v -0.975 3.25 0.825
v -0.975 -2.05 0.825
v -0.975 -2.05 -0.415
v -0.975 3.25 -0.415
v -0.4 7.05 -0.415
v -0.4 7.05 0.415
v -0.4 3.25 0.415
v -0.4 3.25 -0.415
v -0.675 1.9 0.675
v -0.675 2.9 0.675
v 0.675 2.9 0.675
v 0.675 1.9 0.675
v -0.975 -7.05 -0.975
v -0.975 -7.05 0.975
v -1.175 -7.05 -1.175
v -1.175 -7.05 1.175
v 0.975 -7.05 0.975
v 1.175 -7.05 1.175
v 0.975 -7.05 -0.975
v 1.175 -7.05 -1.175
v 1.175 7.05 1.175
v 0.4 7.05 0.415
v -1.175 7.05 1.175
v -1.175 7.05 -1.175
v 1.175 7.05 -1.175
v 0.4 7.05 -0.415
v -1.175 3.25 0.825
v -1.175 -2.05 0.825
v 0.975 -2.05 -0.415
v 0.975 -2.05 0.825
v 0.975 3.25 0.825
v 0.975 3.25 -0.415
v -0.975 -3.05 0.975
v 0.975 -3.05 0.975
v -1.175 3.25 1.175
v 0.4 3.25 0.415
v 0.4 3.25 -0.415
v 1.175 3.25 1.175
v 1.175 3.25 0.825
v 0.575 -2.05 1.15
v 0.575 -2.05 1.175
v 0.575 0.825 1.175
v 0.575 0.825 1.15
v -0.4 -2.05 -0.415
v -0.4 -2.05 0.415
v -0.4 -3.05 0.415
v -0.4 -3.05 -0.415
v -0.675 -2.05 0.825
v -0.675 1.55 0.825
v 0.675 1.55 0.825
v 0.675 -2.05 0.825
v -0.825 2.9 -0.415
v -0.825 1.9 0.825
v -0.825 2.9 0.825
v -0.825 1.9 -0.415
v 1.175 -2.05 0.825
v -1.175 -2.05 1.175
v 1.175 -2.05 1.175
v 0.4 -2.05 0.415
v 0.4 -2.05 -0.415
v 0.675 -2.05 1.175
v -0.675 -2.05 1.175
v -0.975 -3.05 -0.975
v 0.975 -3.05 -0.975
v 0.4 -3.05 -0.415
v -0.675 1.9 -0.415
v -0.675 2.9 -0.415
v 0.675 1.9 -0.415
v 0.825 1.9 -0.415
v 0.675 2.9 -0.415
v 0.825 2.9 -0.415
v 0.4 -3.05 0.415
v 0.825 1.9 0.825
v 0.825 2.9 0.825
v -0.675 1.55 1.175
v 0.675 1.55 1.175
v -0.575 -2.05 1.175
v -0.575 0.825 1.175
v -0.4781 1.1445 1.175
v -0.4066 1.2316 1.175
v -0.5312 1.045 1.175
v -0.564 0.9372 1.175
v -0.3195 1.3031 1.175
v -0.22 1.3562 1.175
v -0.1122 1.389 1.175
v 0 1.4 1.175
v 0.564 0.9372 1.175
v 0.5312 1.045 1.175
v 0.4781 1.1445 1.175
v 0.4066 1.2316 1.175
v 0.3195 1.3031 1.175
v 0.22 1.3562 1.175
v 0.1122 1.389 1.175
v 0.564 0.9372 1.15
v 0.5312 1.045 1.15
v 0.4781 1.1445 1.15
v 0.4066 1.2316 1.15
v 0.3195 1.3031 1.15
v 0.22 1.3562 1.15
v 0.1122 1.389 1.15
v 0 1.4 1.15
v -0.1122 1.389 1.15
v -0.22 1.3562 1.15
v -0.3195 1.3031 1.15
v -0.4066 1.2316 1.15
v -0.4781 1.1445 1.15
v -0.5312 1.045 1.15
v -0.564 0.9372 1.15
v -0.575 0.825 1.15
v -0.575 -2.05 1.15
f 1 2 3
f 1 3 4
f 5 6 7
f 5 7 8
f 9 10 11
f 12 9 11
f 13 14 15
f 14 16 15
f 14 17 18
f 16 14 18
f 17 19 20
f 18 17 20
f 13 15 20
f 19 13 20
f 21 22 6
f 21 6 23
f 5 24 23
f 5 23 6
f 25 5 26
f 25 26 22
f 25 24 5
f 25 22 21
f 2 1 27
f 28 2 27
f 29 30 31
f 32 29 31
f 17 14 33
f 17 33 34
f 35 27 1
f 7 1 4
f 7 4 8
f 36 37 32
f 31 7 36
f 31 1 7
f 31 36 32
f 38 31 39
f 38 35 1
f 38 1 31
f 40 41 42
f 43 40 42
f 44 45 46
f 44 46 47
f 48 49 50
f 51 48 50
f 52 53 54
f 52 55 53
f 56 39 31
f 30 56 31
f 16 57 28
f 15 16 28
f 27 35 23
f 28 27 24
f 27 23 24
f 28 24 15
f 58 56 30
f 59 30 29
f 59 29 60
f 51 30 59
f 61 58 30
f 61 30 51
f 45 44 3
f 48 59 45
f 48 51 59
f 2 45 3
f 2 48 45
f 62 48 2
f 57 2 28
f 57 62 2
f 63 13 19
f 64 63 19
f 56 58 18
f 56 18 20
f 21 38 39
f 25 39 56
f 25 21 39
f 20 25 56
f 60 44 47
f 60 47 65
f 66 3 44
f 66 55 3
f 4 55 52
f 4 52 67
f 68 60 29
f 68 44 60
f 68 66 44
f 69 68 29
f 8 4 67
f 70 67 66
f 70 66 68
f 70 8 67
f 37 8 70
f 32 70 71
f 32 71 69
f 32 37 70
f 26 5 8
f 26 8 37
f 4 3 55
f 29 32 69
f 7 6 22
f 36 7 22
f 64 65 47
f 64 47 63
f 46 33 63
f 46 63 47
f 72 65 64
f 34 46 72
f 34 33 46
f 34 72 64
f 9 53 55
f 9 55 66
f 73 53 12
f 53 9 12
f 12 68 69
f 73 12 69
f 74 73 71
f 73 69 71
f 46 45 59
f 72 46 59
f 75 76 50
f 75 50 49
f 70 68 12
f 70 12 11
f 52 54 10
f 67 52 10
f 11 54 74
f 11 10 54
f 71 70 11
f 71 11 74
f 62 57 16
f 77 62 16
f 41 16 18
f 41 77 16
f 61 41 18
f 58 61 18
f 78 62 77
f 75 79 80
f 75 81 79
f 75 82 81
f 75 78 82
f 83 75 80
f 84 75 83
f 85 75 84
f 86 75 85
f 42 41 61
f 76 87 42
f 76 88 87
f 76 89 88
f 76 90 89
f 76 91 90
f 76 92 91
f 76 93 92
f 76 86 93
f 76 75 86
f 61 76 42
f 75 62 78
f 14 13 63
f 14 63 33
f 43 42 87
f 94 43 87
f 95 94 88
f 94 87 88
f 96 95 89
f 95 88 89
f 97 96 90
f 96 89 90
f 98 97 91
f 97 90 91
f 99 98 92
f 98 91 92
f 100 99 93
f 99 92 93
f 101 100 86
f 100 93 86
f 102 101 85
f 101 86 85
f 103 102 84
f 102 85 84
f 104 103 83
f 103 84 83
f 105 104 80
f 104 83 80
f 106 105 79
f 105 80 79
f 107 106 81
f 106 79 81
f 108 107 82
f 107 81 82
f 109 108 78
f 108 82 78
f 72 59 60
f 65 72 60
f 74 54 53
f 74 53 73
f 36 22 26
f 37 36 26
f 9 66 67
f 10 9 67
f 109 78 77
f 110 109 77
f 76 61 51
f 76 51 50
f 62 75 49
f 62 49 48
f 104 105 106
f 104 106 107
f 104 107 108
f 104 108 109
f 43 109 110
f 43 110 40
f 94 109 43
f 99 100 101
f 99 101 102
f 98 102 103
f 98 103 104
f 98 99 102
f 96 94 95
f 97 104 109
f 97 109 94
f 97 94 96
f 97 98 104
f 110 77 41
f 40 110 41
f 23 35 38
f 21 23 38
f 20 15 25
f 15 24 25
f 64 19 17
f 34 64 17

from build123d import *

# Parameters (mm, degrees)
SKETCH2_W           = 2.35
SKETCH2_H           = 2.35
BOSS_EXTRUDE1_DEPTH = 7.05
PINHOLE_REACH       = 16.1
SKETCH3_W           = 0.8
SKETCH3_H           = 0.83
CUT_EXTRUDE2_DEPTH  = 0.35
SKETCH5_W           = 1.95
SKETCH5_H           = 5.3
CUT_EXTRUDE3_DEPTH  = 1.24
CUT_EXTRUDE5_DEPTH  = 0.025
SKETCH7_W           = 1.95
SKETCH7_H           = 1.95
CUT_EXTRUDE6_DEPTH  = 4
SKETCH9_W           = 0.15
SKETCH9_H           = 1
HOLDER_1_DEPTH      = 1.09
SKETCH10_W          = 1.65
SKETCH10_H          = 1
HOLDER_2_DEPTH      = 0.15


with BuildPart() as part:
    # Sketch2 → Boss-Extrude1 (new body, symmetric)
    with BuildSketch(Plane(origin=(0, 0, 0), x_dir=(1, 0, 0), z_dir=(0, 1, 0))):
        Rectangle(SKETCH2_W, SKETCH2_H)
    extrude(amount=BOSS_EXTRUDE1_DEPTH, both=True)

    # Sketch3 → Pinhole (cut, up to next)
    with BuildSketch(Plane(origin=(0, 7.05, 0), x_dir=(1, 0, 0), z_dir=(0, 1, 0)), mode=Mode.PRIVATE) as pinhole_sk1:
        Rectangle(SKETCH3_W, SKETCH3_H)
    pinhole_tool1 = extrude(pinhole_sk1.sketch, amount=-PINHOLE_REACH, mode=Mode.PRIVATE) & part.part
    add(pinhole_tool1.solids().sort_by_distance((0, 7.05, 0))[0], mode=Mode.SUBTRACT)

    # Sketch4 → Cut-Extrude2 (cut)
    with BuildSketch(Plane.XY.offset(1.175)):
        Polygon((-1.175, 3.25), (1.175, 3.25), (1.175, -2.05), (0.675, -2.05), (0.675, 1.55), (-0.675, 1.55), (-0.675, -2.05), (-1.175, -2.05), align=None)
    extrude(amount=-CUT_EXTRUDE2_DEPTH, mode=Mode.SUBTRACT)

    # Sketch5 → Cut-Extrude3 (cut)
    with BuildSketch(Plane.XY.offset(0.825)):
        with Locations((0, 0.6)):
            Rectangle(SKETCH5_W, SKETCH5_H)
    extrude(amount=-CUT_EXTRUDE3_DEPTH, mode=Mode.SUBTRACT)

    # Sketch6 → Cut-Extrude5 (cut)
    with BuildSketch(Plane.XY.offset(1.175)):
        with BuildLine():
            Line((-0.575, 0.825), (-0.575, -2.05))
            Line((-0.575, -2.05), (0.575, -2.05))
            Line((0.575, -2.05), (0.575, 0.825))
            ThreePointArc((0.575, 0.825), (0, 1.4), (-0.575, 0.825))
        make_face()
    extrude(amount=-CUT_EXTRUDE5_DEPTH, mode=Mode.SUBTRACT)

    # Sketch7 → Cut-Extrude6 (cut)
    with BuildSketch(Plane.XZ.offset(7.05)):
        Rectangle(SKETCH7_W, SKETCH7_H)
    extrude(amount=-CUT_EXTRUDE6_DEPTH, mode=Mode.SUBTRACT)

    # Sketch9 → Holder-1 (add)
    with BuildSketch(Plane.XY.offset(-0.415)):
        with Locations((-0.75, 2.4)):
            Rectangle(SKETCH9_W, SKETCH9_H)
        with Locations((0.75, 2.4)):
            Rectangle(SKETCH9_W, SKETCH9_H)
    extrude(amount=HOLDER_1_DEPTH)

    # Sketch10 → Holder-2 (add)
    with BuildSketch(Plane.XY.offset(0.675)):
        with Locations((0, 2.4)):
            Rectangle(SKETCH10_W, SKETCH10_H)
    extrude(amount=HOLDER_2_DEPTH)


solid = part.part
